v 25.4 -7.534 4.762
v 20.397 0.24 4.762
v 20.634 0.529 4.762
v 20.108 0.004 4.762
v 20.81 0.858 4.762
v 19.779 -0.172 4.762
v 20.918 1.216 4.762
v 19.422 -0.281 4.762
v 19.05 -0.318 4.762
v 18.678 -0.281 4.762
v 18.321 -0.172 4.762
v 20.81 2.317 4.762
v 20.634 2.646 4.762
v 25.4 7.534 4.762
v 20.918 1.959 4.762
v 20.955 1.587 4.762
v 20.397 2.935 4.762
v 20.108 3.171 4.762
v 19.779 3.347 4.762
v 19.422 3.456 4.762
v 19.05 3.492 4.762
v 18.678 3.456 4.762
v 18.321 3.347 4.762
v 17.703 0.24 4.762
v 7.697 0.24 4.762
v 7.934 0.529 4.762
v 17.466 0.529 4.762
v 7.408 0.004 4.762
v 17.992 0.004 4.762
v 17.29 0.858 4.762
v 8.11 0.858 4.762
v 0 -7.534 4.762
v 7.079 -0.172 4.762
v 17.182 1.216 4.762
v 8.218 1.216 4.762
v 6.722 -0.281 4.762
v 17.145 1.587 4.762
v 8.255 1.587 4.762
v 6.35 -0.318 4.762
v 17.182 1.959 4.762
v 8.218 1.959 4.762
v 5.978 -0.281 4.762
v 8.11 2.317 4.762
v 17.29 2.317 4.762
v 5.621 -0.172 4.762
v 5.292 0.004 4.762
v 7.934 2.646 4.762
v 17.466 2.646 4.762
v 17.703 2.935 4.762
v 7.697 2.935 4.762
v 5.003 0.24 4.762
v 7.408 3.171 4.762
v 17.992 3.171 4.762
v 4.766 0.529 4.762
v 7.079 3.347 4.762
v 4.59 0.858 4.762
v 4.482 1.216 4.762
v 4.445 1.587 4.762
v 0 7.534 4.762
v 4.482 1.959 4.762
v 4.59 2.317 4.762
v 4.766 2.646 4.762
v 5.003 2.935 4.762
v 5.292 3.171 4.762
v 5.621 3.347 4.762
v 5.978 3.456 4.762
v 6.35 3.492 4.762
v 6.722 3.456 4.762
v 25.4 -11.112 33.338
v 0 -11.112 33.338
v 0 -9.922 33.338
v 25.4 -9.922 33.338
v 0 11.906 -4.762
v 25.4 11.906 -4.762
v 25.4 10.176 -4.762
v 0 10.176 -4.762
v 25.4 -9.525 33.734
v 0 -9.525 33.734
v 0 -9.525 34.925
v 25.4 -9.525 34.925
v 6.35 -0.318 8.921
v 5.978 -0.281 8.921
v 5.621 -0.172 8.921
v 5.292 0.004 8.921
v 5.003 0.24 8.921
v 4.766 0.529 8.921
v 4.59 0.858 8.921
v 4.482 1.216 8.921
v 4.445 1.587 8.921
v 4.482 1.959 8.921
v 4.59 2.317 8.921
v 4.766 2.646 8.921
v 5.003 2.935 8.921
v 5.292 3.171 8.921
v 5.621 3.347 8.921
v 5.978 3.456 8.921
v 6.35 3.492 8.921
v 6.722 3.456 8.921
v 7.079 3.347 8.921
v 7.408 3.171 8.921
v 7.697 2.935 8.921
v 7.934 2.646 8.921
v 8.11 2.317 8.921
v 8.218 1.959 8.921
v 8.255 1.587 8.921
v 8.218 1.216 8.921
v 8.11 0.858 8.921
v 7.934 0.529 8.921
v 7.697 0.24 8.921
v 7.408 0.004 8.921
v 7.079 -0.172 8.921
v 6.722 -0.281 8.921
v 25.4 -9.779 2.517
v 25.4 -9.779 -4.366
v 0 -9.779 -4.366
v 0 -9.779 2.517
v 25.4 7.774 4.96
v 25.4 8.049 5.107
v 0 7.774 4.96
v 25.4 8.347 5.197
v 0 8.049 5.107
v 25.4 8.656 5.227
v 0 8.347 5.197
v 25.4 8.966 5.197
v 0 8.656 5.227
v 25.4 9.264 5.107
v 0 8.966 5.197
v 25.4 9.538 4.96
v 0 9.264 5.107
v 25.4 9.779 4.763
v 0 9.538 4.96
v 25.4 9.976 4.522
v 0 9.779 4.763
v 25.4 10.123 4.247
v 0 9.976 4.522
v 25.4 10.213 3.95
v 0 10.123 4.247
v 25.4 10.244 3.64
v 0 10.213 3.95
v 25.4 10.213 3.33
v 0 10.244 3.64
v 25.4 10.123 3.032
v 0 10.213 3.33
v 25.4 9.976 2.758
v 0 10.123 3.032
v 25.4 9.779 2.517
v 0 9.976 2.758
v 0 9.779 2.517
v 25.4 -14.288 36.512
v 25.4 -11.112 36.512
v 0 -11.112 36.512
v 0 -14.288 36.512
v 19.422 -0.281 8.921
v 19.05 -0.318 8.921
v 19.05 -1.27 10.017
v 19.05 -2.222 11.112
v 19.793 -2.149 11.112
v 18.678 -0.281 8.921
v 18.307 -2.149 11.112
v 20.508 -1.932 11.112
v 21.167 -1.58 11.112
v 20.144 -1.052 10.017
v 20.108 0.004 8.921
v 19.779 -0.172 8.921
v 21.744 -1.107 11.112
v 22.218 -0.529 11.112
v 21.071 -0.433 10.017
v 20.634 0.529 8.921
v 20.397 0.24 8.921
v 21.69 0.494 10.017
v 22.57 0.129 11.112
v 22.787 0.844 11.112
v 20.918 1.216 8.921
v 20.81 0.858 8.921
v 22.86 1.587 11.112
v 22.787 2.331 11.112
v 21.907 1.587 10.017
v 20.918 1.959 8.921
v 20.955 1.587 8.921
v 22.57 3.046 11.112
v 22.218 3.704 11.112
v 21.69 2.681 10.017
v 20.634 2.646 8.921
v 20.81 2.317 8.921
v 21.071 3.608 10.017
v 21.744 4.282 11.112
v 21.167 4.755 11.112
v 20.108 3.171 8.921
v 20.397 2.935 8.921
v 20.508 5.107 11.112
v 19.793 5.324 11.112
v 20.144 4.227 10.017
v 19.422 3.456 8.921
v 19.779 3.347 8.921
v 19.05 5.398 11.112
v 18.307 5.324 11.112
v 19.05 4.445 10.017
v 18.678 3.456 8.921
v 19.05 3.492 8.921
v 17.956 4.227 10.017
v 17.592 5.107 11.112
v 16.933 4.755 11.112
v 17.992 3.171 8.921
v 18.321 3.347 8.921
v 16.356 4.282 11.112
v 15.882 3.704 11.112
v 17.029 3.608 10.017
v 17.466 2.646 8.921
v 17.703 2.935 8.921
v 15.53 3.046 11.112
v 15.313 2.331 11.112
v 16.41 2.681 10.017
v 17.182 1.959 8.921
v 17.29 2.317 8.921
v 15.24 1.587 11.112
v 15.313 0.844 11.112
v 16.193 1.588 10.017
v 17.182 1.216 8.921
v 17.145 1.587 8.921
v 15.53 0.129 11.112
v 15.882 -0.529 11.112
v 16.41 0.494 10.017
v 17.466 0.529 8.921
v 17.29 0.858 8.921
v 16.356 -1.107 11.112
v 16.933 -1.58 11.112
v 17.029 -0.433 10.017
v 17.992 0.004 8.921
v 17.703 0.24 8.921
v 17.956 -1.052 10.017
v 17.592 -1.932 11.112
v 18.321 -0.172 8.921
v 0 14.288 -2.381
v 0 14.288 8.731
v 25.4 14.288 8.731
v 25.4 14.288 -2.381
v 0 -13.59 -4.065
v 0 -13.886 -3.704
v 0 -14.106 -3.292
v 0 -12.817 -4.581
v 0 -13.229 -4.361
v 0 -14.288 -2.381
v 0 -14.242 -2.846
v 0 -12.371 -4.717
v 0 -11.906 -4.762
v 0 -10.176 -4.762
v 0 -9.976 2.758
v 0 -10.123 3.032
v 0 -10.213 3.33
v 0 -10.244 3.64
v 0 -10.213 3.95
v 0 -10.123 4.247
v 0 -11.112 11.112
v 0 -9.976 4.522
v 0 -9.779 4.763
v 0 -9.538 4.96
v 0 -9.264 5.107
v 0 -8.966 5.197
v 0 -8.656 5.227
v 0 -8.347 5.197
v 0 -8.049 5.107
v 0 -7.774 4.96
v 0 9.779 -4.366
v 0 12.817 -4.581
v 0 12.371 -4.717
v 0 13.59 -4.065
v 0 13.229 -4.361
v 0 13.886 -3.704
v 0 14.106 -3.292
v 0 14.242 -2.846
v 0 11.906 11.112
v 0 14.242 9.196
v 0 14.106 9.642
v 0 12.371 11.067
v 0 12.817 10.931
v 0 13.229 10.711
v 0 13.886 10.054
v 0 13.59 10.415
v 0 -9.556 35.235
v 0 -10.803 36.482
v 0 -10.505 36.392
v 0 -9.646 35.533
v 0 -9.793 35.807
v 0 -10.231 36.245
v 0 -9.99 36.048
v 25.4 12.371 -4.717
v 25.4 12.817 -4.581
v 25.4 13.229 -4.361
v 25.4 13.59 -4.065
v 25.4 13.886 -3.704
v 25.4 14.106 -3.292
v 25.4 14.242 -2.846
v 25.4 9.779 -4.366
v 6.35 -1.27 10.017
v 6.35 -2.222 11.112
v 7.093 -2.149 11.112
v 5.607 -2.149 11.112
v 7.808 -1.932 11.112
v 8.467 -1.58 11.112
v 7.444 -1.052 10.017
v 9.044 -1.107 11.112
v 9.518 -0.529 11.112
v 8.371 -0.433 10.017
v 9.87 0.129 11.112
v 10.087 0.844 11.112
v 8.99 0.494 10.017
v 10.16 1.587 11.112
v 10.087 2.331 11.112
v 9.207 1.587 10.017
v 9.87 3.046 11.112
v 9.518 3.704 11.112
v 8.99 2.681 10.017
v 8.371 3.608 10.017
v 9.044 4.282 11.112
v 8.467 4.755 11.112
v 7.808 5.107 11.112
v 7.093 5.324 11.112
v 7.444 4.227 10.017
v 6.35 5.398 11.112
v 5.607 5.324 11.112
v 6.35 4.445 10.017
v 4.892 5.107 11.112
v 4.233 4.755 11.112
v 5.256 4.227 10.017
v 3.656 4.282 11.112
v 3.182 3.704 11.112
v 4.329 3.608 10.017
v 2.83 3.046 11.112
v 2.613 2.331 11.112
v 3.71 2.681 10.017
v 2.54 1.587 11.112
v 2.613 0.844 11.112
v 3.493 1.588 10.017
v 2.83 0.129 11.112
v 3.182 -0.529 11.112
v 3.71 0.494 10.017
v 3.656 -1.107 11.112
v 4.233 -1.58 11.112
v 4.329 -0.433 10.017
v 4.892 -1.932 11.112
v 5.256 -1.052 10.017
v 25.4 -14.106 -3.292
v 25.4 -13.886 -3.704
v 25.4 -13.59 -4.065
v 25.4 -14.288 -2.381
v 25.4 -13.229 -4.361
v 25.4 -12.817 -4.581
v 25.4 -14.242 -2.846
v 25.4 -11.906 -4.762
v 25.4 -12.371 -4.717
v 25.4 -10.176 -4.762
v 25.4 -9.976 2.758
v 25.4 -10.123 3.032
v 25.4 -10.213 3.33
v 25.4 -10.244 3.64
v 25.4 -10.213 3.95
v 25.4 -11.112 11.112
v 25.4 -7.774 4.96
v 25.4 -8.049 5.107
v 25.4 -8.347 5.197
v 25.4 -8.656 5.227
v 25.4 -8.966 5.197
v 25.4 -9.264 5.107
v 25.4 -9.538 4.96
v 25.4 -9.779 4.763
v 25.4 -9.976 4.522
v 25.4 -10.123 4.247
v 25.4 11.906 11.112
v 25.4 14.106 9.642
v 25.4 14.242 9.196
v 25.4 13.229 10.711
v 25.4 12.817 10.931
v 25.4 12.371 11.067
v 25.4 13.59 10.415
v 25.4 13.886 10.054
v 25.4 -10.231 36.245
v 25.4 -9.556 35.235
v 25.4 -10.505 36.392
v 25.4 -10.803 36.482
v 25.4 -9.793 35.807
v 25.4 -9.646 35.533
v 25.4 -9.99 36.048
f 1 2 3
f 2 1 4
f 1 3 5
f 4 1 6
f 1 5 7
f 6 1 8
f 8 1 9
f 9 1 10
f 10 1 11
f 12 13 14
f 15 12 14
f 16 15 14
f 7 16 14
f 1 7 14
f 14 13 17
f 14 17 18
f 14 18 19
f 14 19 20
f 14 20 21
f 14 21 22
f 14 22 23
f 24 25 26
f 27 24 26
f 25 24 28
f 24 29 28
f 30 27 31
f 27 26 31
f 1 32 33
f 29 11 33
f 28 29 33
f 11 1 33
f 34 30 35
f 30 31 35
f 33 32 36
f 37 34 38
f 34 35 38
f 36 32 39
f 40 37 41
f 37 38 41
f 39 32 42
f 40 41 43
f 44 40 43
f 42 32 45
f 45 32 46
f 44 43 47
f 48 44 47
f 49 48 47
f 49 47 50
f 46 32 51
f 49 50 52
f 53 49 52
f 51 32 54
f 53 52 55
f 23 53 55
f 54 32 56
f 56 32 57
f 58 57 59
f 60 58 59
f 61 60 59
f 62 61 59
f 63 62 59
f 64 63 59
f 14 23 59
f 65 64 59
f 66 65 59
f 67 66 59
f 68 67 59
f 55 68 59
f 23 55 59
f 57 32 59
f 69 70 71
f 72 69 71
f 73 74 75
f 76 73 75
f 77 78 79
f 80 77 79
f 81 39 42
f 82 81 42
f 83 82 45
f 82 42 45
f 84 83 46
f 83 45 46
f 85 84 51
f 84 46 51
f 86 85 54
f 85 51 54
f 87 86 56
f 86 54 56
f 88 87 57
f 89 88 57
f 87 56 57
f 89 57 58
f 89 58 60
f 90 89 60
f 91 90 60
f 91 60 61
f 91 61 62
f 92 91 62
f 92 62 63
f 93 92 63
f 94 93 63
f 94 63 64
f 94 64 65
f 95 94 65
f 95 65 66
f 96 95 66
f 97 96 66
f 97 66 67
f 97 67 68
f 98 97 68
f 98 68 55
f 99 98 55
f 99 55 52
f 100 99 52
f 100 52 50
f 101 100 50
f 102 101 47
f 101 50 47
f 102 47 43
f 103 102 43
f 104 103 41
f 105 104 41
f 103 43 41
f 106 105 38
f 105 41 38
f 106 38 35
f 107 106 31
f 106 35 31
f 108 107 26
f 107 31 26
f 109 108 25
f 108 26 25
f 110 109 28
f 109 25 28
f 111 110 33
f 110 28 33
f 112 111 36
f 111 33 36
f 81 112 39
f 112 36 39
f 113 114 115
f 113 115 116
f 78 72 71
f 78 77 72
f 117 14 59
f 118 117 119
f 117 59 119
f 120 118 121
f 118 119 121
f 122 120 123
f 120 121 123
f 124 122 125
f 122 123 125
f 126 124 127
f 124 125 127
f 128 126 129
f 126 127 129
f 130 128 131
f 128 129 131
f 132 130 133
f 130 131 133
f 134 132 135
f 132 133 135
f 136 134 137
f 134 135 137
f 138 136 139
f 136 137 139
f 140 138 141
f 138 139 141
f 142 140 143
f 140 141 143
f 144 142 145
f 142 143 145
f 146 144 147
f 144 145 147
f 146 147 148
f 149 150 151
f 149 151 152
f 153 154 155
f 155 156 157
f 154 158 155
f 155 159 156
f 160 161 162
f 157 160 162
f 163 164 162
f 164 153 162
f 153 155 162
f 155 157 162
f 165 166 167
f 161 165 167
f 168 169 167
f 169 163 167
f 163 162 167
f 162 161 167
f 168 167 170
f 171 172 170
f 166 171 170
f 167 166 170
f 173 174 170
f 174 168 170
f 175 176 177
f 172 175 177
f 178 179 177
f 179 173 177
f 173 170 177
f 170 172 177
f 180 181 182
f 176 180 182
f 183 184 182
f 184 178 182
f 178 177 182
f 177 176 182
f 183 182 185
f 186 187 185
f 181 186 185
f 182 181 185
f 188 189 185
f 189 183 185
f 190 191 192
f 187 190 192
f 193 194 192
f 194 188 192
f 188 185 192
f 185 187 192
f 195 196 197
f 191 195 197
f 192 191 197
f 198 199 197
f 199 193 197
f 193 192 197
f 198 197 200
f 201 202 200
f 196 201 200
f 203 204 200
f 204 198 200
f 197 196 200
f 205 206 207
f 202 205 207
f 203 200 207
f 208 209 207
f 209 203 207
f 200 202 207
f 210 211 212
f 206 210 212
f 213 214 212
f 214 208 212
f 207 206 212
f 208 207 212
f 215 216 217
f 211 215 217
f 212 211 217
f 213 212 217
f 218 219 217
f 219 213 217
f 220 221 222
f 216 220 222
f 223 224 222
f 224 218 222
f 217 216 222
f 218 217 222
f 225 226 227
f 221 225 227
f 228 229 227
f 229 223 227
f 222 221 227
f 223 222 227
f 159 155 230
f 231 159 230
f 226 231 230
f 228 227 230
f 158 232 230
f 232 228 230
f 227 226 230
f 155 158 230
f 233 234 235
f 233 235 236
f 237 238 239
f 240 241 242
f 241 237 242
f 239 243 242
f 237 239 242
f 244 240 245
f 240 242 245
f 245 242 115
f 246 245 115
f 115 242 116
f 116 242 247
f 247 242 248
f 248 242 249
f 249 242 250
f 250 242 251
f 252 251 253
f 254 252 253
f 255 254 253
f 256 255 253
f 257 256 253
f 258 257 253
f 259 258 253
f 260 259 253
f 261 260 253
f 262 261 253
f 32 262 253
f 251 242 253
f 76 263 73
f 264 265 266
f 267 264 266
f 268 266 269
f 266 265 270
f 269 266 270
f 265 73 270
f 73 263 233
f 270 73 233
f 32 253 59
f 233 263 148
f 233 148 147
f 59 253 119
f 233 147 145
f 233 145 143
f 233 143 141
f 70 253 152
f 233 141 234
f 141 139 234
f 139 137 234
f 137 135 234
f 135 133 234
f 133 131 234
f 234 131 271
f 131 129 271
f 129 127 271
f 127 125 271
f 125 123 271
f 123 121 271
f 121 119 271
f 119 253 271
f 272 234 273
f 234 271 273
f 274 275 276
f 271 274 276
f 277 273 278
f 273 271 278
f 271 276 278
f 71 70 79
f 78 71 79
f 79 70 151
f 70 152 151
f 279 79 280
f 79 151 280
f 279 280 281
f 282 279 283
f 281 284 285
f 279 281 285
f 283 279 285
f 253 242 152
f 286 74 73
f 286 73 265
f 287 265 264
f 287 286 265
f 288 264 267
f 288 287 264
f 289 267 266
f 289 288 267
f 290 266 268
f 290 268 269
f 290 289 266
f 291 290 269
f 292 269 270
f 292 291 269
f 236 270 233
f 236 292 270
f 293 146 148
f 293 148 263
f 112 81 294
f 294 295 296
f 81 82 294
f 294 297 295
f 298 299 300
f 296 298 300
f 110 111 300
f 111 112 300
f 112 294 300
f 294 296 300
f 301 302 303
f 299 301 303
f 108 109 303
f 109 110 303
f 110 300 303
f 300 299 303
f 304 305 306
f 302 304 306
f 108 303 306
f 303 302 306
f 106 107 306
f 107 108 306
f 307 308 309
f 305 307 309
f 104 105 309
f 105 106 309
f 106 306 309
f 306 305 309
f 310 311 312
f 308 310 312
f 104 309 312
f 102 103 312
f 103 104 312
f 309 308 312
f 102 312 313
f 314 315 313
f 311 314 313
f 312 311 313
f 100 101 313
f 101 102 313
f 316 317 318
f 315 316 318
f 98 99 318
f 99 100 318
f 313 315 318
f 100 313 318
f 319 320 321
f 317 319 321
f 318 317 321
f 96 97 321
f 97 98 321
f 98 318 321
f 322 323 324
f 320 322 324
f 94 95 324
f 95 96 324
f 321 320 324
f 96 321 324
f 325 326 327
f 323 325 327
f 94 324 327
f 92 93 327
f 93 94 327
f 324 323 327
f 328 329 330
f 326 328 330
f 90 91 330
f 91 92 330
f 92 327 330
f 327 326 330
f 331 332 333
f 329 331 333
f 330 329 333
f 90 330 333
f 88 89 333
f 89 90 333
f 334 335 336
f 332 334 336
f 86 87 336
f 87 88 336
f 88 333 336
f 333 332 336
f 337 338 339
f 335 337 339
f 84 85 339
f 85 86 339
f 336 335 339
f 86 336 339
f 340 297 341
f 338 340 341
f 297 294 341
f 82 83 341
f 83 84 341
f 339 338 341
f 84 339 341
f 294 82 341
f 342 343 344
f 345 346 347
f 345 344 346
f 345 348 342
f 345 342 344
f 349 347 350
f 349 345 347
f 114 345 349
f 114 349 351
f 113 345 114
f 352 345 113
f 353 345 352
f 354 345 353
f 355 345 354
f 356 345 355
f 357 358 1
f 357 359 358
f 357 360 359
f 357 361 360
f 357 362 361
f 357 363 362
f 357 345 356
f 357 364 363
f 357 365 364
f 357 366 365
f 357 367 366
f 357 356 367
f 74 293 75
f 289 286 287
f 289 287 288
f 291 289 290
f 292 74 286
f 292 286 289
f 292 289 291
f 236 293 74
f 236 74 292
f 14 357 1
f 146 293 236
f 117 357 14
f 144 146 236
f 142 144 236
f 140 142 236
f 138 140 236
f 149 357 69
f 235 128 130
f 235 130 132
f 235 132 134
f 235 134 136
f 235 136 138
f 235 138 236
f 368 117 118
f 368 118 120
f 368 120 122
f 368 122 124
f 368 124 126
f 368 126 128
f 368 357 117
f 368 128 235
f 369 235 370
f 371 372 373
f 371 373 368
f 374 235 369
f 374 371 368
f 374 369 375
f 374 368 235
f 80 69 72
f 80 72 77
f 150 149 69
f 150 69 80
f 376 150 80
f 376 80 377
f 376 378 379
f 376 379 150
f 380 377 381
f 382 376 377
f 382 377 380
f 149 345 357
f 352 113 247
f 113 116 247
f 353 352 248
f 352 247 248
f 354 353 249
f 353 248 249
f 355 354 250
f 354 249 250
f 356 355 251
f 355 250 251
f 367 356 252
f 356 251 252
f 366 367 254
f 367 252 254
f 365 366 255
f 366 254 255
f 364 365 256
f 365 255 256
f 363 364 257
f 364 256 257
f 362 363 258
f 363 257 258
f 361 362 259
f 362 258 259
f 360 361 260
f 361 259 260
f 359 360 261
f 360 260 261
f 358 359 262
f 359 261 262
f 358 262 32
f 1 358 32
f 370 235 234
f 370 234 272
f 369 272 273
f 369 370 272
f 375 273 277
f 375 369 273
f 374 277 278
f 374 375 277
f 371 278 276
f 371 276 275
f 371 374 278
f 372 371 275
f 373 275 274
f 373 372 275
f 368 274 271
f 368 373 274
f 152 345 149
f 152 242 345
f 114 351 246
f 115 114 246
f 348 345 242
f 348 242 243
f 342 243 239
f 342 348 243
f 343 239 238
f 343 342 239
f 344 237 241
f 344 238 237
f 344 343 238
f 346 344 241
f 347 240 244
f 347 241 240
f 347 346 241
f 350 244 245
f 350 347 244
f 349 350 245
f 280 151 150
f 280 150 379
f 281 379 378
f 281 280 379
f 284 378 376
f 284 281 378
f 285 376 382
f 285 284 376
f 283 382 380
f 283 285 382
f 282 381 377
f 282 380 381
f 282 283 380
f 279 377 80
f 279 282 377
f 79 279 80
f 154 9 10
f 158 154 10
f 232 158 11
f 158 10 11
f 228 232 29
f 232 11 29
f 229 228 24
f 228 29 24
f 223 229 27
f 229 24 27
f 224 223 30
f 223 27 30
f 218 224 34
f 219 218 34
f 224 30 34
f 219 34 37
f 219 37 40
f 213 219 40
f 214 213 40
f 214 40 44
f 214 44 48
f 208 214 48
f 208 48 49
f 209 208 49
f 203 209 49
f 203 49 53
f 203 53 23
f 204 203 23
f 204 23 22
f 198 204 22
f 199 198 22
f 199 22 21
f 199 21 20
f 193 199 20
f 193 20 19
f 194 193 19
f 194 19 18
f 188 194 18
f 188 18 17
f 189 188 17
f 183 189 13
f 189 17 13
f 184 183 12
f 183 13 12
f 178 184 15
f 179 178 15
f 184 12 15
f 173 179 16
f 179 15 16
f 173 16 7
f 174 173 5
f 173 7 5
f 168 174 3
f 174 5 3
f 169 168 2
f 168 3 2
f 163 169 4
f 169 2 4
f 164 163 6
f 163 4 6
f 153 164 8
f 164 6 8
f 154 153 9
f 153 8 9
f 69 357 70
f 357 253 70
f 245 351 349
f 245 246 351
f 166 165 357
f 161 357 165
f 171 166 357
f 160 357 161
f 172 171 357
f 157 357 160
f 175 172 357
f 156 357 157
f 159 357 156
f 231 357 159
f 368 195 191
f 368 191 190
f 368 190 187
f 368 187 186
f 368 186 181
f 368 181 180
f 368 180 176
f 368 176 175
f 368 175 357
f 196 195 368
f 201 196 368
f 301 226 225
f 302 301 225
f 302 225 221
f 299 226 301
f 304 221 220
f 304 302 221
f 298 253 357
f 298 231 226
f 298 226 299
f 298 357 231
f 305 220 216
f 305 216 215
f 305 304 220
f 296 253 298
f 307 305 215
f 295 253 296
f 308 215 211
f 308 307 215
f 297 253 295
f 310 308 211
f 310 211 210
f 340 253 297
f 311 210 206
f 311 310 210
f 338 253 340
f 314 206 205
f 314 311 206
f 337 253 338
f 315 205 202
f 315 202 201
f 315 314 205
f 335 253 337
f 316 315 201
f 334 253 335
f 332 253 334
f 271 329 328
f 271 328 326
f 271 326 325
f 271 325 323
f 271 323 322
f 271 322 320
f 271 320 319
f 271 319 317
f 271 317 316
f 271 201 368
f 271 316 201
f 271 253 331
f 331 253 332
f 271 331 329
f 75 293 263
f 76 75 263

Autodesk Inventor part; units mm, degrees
ref_plane "YZ Plane" through (0, 0, 0) normal (1, 0, 0) x (0, 1, 0)
ref_plane "XZ Plane" through (0, 0, 0) normal (0, 1, 0) x (-1, 0, 0)
ref_plane "XY Plane" through (0, 0, 0) normal (0, 0, 1) x (1, 0, 0)
sketch "Sketch1" plane through (0, 0, 0) normal (1, 0, 0) x (0, 1, 0)
  line L0 (-9.525, 4.7625) -> (9.525, 4.7625) construction
  line L1 (9.525, 4.7625) -> (9.525, -4.7625) construction
  line L2 (9.525, -4.7625) -> (-9.525, -4.7625) construction
  line L3 (-9.525, -4.7625) -> (-9.525, 4.7625) construction
  line L4 (-9.525, 4.7625) -> (9.525, -4.7625) construction
  line L5 (9.525, 4.7625) -> (-9.525, -4.7625) construction
  line L6 (-9.779, 4.7625) -> (9.779, 4.7625)
  line L7 (9.779, 4.7625) -> (9.779, -4.7625)
  line L8 (9.779, -4.7625) -> (-9.779, -4.7625) construction
  line L9 (-9.779, -4.7625) -> (-9.779, 4.7625)
  line L10 (-9.779, 4.7625) -> (9.779, -4.7625) construction
  line L11 (9.779, 4.7625) -> (-9.779, -4.7625) construction
  line L12 (-14.2875, 11.1125) -> (14.2875, 11.1125)
  line L13 (14.2875, 11.1125) -> (14.2875, -4.7625)
  line L14 (14.2875, -4.7625) -> (-14.2875, -4.7625)
  line L15 (-14.2875, -4.7625) -> (-14.2875, 11.1125)
  line L16 (-14.2875, 11.1125) -> (14.2875, -4.7625) construction
  line L17 (14.2875, 11.1125) -> (-14.2875, -4.7625) construction
  line L18 (0, 4.7625) -> (0, 0) construction
  line L19 (-14.2875, 11.1125) -> (-11.1125, 11.1125)
  line L20 (-11.1125, 11.1125) -> (-11.1125, 33.3375)
  line L21 (-11.1125, 33.3375) -> (-14.2875, 33.3375)
  line L22 (-14.2875, 33.3375) -> (-14.2875, 11.1125)
  line L23 (-14.2875, 33.3375) -> (-11.1125, 33.3375)
  line L24 (-11.1125, 33.3375) -> (-11.1125, 36.5125) construction
  line L25 (-11.1125, 36.5125) -> (-14.2875, 36.5125)
  line L26 (-14.2875, 36.5125) -> (-14.2875, 33.3375)
  circle A0 centre (-11.1125, 34.925) radius 1.5875
  circle A1 centre (8.6565, 3.64) radius 1.5875
  line L27 (8.6565, 3.64) -> (9.779, 4.7625) construction
  circle A2 centre (-8.6565, 3.64) radius 1.5875
  line L28 (-11.1125, 33.3375) -> (-9.525, 33.3375)
  line L29 (-9.525, 33.3375) -> (-9.525, 34.925)
  line L30 (-9.525, 34.925) -> (-11.1125, 34.925) construction
  line L31 (-11.1125, 34.925) -> (-11.1125, 33.3375)
  point P0 (0, 3.175)
  point P1 (-9.779, 2.5174)
  point P2 (-7.5339, 4.7625)
  point P3 (7.5339, 4.7625)
  point P4 (9.779, 2.5174)
  dimension "d11" = 3.175
  dimension "d0" = 19.05
  dimension "d1" = 9.525
  dimension "d2" = 19.558
  dimension "d3" = 6.35
  dimension "d4" = 28.575
  dimension "d5" = 3.175
  dimension "d6" = 22.225
  dimension "d7" = 3.175
  dimension "d8" = 3.175
extrude "Extrusion1" add sketch "Sketch1" along normal blind 25.4 contours A2 L9 L14 L15 L12 L13 L7 A1 L6 | L22 L21 L20 L12 | L26 L25 A0 L21 | A0 | A0 L29 L28
chamfer "Chamfer1" distance 0.3969 angle 45 3 edges at (12.7, -9.779, -4.7625) (12.7, 9.779, -4.7625) (12.7, -9.525, 33.3375)
fillet "Fillet1" radius 2.3813 2 edges at (12.7, 14.2875, -4.7625) (12.7, -14.2875, -4.7625)
fillet "Fillet2" radius 2.3813 1 edges at (12.7, 14.2875, 11.1125)
sketch "Sketch2" plane through (0, -11.1125, 11.1125) normal (0, 0, 1) x (1, 0, 0)
  line L0 (0, 23.0188) -> (0, 0) projected
  line L1 (0, 12.7) -> (25.4, 12.7) construction
  line L2 (25.4, 3.5786) -> (25.4, 18.6464) projected
  line L3 (25.4, 25.4) -> (0, 25.4) projected
  point P0 (0, 11.1125)
  point P1 (6.35, 12.7)
  point P2 (19.05, 12.7)
  dimension "d17" = 12.7
  dimension "d18" = 6.35
  dimension "d21" = 12.7
hole "Hole1" at (6.35, 1.5875, 11.1125) at (19.05, 1.5875, 11.1125) direction (0, 0, -1) diameter 3.81 end through all countersink diameter 7.62 countersink angle 82 clearance for "Flat Head Machine Screw (82)" size "#6" standard "Ansi Unified Screw Threads"
properties part number "Door Bracket"
